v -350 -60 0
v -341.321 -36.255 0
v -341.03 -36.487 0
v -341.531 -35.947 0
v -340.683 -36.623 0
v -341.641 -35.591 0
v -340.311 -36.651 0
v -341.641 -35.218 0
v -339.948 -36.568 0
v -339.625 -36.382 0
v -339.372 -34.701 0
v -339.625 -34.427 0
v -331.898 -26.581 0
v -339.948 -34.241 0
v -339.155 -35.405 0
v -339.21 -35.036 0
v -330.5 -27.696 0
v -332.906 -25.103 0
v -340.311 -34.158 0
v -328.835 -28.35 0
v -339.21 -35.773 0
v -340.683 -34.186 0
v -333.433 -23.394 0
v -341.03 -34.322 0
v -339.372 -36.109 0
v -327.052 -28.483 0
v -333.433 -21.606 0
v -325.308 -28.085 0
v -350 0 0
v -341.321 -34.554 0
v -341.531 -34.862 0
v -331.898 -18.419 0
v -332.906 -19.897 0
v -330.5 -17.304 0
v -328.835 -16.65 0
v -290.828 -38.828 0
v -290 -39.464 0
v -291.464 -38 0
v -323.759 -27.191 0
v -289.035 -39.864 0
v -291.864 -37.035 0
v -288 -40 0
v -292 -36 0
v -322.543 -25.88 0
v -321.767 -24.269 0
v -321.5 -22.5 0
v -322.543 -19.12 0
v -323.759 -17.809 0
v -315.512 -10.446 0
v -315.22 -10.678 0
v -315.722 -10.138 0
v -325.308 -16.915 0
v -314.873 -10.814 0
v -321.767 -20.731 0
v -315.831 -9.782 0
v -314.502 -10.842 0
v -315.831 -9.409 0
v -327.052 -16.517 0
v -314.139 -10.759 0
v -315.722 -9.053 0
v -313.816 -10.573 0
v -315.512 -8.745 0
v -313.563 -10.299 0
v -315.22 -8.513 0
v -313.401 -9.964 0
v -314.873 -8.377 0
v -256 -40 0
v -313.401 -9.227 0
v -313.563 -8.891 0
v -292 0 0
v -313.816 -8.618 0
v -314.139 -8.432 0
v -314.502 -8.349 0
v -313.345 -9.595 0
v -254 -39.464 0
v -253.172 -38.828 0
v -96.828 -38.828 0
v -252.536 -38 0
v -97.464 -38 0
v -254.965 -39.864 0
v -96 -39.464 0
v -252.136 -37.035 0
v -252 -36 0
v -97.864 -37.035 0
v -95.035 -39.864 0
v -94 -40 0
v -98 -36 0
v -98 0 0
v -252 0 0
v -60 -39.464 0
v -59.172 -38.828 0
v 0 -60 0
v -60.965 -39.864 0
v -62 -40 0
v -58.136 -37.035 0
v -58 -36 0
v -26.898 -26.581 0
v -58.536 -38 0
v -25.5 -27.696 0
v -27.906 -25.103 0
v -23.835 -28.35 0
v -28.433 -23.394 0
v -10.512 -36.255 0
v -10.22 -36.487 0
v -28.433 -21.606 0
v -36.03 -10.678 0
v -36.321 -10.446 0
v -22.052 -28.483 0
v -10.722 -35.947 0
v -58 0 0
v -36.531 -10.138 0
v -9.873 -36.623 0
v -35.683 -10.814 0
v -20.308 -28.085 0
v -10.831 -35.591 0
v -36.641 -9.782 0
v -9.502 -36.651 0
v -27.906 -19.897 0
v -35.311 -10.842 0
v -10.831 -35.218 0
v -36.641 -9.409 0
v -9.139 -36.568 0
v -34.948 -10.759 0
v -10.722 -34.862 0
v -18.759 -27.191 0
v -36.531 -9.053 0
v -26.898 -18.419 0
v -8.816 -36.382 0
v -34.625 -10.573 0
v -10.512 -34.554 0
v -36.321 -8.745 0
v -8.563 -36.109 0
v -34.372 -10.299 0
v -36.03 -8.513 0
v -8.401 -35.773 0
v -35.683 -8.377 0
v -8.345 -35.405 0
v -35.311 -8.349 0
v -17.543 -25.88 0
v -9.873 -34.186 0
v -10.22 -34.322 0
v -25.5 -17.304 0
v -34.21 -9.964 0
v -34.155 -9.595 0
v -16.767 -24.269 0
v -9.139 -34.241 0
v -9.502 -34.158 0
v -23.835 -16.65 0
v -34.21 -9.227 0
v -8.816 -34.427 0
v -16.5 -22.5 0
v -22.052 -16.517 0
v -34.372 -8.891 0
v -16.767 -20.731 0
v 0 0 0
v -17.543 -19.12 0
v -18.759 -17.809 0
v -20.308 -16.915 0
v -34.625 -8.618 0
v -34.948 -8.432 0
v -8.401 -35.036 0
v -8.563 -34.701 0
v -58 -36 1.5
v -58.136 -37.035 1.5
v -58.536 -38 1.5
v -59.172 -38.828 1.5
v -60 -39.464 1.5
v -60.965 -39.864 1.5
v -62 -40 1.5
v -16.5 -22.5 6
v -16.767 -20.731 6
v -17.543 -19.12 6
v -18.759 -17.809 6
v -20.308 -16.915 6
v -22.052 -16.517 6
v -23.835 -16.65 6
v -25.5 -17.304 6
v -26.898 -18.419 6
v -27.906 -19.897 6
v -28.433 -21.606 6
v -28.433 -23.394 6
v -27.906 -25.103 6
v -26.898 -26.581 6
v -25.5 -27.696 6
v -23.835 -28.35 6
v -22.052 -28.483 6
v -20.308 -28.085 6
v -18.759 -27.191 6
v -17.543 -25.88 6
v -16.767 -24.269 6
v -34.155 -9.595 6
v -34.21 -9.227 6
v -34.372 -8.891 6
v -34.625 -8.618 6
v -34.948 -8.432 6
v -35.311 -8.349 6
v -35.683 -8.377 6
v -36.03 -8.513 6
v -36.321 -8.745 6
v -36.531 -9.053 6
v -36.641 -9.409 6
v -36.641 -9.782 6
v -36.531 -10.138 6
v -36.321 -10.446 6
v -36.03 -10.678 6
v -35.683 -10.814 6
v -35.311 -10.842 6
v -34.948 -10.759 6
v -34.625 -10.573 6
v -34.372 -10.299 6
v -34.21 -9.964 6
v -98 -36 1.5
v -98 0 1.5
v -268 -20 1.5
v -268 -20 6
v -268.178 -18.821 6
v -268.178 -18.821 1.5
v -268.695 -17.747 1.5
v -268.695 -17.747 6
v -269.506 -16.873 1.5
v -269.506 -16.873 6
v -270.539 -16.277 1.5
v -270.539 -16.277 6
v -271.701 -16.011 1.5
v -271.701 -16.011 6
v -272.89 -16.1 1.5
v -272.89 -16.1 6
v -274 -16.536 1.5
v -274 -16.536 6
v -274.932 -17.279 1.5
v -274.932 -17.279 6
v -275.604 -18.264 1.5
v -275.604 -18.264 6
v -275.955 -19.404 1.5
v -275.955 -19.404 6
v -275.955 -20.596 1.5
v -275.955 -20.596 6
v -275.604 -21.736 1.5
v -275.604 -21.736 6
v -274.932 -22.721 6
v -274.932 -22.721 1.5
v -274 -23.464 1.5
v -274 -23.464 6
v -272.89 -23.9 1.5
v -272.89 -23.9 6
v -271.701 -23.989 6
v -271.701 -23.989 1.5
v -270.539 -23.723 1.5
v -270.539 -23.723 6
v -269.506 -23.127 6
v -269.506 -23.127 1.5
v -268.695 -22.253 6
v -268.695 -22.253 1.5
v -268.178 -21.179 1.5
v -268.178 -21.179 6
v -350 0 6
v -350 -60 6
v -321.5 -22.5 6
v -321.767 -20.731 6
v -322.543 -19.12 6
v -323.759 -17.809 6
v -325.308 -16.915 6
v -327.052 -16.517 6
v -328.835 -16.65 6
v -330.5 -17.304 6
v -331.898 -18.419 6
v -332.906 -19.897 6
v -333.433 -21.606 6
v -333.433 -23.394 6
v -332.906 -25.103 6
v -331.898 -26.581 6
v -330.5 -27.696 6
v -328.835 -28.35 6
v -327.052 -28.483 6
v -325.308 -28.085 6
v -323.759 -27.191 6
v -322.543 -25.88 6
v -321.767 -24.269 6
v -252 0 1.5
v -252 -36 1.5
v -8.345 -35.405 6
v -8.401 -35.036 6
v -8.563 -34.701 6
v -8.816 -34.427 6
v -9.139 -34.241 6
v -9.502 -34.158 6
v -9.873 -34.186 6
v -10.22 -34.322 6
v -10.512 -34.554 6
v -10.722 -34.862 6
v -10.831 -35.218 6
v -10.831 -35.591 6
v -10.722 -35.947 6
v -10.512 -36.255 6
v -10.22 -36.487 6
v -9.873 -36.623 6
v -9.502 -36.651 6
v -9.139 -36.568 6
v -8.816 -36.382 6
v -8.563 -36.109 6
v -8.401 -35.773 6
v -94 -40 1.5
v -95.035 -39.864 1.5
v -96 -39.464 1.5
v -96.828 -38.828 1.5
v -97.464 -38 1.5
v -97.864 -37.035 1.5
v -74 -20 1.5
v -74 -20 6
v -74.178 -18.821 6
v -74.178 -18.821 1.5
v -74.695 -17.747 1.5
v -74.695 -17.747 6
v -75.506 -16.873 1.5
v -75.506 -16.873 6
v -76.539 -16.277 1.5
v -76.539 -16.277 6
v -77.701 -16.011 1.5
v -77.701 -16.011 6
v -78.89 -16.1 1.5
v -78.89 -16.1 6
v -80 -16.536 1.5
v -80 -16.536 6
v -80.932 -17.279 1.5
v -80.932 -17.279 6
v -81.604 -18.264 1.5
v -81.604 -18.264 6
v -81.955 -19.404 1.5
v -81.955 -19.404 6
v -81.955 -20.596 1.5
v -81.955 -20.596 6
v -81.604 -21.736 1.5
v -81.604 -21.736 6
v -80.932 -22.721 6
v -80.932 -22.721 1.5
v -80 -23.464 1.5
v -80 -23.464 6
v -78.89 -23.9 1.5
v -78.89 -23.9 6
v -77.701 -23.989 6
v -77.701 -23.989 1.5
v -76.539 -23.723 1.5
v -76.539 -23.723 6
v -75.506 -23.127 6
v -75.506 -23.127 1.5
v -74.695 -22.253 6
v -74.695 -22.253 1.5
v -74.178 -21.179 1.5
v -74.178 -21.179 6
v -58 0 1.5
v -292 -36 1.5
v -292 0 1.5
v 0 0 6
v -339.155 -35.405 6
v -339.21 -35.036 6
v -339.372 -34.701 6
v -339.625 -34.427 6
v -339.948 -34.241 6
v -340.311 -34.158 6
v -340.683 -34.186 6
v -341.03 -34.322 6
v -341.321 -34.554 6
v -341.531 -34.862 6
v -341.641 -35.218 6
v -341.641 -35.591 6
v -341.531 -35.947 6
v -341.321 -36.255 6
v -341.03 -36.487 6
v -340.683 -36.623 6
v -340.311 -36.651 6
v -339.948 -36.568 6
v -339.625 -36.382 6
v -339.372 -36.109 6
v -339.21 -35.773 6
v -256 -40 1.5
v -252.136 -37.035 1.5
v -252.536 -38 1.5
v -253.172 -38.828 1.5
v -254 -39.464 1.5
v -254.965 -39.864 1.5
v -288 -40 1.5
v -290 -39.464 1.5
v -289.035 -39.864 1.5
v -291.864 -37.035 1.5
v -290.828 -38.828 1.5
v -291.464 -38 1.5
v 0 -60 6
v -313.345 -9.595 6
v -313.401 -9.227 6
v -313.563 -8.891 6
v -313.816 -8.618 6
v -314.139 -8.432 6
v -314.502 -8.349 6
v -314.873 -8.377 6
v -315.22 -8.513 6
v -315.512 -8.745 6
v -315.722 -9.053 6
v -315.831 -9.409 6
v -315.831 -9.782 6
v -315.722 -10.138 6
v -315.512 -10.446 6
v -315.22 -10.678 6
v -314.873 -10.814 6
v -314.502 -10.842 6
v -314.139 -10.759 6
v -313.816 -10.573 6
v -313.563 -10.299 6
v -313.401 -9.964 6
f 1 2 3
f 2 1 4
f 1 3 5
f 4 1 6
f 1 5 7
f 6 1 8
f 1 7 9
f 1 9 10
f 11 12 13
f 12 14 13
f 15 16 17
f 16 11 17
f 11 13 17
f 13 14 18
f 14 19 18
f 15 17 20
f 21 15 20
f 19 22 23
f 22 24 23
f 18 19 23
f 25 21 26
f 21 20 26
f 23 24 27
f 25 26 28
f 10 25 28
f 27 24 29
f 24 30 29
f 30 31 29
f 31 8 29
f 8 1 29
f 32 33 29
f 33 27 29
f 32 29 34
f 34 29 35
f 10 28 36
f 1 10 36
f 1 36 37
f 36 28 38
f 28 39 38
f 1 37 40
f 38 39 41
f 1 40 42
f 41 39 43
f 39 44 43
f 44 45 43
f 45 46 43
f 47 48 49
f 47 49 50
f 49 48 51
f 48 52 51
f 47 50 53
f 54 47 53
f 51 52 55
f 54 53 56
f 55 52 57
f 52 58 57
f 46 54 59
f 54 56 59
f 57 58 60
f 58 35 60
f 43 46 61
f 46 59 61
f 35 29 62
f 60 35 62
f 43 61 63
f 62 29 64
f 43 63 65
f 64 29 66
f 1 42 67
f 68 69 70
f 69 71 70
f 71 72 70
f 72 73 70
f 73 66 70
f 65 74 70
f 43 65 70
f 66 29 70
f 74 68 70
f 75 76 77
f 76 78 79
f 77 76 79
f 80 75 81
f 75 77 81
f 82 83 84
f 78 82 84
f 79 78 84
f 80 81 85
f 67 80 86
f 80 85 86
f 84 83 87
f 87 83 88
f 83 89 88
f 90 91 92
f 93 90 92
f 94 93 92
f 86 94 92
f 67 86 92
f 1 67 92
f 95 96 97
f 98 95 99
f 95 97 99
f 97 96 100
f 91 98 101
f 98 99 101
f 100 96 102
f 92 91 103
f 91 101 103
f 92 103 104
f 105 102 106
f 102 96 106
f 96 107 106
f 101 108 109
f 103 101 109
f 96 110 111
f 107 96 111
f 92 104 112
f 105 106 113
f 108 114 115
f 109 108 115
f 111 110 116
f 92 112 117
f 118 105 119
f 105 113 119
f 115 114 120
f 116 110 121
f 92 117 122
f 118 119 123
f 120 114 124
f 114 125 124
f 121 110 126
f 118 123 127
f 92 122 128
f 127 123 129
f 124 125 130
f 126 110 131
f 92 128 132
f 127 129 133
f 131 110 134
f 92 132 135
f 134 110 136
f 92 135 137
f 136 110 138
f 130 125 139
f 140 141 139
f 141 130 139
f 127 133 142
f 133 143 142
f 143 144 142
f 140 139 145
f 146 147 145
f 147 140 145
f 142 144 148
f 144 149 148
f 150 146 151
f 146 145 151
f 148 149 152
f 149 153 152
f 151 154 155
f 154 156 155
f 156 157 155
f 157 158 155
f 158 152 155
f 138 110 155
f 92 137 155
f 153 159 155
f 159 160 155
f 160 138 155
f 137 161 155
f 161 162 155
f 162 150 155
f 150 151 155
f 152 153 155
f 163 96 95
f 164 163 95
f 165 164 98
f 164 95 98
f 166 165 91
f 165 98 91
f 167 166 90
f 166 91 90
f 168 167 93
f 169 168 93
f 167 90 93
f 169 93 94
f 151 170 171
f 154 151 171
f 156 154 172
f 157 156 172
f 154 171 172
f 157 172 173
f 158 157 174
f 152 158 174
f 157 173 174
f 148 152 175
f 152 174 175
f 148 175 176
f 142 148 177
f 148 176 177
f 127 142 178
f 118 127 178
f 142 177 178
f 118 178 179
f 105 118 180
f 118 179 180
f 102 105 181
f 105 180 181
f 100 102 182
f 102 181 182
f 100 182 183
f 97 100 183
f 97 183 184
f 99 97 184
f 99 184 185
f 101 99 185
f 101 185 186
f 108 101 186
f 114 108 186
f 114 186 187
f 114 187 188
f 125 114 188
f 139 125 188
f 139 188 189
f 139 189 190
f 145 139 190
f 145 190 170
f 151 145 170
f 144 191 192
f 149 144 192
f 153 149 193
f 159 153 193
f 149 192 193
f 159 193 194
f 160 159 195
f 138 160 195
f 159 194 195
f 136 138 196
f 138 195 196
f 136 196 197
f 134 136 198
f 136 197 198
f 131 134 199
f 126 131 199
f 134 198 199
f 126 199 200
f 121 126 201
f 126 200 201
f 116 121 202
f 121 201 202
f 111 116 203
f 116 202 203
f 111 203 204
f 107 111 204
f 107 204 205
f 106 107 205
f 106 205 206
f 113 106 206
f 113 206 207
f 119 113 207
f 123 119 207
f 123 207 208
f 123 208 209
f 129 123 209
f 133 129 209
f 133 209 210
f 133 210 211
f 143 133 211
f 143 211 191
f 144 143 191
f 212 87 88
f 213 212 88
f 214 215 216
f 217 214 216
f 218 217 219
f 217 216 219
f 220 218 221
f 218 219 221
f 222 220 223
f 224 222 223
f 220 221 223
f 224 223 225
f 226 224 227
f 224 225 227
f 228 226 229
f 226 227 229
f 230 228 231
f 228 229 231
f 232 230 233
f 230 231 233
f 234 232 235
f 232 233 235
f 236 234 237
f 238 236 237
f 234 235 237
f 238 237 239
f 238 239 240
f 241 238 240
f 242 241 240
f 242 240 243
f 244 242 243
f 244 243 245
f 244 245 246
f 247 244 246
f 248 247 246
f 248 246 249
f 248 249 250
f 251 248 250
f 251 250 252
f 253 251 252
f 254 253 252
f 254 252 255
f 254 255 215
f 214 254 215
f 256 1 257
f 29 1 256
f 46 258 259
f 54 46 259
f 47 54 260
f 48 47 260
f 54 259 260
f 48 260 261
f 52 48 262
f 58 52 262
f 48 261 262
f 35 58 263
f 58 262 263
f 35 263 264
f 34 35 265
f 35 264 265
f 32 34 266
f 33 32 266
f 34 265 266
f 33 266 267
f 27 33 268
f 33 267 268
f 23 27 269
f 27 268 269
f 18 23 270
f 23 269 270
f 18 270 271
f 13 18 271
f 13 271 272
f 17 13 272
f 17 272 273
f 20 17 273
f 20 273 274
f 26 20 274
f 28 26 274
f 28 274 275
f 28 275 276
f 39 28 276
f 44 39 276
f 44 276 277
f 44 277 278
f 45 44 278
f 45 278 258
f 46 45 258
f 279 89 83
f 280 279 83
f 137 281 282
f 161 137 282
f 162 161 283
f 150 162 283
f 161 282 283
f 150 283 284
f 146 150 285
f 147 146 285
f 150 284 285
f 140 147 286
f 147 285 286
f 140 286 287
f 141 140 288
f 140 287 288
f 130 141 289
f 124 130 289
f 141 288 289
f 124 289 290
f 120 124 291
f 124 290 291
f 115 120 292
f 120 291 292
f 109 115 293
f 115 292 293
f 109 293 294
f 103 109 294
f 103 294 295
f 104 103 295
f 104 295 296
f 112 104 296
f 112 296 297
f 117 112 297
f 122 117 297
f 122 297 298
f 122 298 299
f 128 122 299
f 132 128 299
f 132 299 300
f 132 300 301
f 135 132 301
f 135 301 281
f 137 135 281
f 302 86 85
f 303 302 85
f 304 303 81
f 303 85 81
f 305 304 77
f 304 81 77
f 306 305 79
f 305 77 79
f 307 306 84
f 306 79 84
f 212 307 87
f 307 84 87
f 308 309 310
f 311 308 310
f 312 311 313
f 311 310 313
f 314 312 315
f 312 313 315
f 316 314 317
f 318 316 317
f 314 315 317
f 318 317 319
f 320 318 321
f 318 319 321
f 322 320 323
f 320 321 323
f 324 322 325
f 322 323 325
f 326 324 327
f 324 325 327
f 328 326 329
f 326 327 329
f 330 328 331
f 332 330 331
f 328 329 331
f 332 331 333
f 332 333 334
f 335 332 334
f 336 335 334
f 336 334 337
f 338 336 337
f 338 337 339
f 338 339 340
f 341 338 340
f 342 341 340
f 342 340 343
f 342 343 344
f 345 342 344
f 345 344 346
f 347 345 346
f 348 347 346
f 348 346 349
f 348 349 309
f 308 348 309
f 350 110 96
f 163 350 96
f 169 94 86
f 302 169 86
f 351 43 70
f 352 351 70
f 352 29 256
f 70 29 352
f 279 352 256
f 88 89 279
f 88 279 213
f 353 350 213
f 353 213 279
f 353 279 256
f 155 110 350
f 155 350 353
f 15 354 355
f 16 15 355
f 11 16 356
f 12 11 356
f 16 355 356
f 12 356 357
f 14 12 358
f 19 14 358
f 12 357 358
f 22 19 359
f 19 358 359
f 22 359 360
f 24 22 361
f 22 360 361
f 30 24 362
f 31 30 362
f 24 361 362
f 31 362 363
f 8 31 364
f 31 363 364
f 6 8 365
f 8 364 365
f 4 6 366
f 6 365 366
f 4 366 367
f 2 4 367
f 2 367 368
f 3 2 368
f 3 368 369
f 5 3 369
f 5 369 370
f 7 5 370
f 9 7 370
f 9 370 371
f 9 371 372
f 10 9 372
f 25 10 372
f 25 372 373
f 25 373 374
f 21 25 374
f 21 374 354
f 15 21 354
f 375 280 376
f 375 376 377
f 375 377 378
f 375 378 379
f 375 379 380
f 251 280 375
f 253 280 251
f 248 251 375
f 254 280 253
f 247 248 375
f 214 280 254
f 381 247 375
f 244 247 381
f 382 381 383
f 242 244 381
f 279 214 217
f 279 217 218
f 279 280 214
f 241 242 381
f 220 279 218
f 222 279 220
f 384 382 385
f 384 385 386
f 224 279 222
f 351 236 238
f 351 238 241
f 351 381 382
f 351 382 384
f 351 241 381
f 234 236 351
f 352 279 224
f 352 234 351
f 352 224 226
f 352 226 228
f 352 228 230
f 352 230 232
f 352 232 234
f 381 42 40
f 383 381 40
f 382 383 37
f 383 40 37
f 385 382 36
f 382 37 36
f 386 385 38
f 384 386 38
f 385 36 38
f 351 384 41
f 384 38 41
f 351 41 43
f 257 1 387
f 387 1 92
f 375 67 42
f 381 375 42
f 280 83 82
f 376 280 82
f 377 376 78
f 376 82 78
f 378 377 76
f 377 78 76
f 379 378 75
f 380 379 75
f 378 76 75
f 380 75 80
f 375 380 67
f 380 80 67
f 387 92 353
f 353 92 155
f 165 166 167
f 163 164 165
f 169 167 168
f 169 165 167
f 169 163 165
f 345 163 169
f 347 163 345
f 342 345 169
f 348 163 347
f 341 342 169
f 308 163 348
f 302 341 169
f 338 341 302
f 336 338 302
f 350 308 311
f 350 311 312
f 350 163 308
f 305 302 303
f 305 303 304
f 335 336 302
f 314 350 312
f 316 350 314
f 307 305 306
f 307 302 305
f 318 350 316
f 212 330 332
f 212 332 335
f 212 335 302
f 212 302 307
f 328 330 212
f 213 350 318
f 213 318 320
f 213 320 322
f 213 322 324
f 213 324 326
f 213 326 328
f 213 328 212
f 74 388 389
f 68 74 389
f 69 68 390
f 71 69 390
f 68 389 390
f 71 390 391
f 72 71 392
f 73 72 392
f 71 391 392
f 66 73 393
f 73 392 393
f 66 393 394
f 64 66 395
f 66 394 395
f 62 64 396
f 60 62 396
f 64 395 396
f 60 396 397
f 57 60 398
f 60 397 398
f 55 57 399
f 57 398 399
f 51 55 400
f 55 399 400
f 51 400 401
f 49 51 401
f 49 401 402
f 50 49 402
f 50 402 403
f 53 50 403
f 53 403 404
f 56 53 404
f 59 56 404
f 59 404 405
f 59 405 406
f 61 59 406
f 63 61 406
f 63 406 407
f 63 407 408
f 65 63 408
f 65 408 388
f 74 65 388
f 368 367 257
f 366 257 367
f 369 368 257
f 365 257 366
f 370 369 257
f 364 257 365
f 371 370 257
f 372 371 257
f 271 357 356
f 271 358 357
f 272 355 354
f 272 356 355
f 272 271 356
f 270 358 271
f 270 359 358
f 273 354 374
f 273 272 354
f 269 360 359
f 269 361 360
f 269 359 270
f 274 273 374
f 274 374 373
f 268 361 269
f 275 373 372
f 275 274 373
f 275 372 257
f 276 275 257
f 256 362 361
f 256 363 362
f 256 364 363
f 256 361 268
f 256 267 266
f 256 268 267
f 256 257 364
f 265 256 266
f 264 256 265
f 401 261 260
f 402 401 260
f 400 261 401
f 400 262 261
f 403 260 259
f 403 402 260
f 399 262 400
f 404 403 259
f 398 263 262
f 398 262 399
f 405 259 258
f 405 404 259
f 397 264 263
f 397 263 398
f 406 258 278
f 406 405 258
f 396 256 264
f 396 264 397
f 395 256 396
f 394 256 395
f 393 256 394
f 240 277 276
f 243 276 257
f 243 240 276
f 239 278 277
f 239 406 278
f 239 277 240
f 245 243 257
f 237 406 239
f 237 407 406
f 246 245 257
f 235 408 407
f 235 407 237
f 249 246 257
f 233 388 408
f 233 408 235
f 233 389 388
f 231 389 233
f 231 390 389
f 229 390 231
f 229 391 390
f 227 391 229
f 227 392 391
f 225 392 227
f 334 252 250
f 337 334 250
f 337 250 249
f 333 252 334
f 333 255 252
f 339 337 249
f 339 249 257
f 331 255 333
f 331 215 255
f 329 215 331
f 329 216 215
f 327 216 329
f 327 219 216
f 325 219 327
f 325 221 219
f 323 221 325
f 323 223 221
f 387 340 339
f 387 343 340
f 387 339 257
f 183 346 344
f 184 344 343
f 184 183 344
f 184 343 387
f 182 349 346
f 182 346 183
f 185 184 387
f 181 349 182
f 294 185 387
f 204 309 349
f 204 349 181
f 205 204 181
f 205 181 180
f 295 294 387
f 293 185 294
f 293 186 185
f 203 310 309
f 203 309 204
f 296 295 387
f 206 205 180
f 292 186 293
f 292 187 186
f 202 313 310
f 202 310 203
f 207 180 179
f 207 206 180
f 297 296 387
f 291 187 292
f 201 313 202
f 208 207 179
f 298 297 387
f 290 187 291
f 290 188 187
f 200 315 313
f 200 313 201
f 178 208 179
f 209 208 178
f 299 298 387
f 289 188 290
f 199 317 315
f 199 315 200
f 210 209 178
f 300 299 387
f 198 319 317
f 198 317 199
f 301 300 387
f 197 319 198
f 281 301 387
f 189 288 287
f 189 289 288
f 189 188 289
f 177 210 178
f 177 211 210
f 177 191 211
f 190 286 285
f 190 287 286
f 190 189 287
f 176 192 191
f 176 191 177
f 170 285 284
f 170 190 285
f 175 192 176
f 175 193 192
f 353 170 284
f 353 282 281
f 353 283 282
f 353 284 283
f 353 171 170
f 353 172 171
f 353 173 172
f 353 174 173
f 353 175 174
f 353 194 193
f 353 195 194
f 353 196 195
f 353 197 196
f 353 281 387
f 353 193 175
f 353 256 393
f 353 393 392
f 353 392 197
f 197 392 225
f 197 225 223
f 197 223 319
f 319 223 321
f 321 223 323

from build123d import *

# Parameters (mm, degrees)
CROQUIS1_W              = 350
CROQUIS1_H              = 60
SALIENTE_EXTRUIR1_DEPTH = 6
CROQUIS2_R              = 6
CROQUIS2_R_2            = 1.25
CORTAR_EXTRUIR1_DEPTH   = 7
CORTAR_EXTRUIR4_DEPTH   = 1.5
CROQUIS4_R              = 4
CORTAR_EXTRUIR5_DEPTH   = 7


with BuildPart() as part:
    # Croquis1 → Saliente-Extruir1 (new body)
    with BuildSketch(Plane.XY):
        with Locations((-175, -30)):
            Rectangle(CROQUIS1_W, CROQUIS1_H)
    extrude(amount=SALIENTE_EXTRUIR1_DEPTH)

    # Croquis2 → Cortar-Extruir1 (cut, through all)
    with BuildSketch(Plane.XY.offset(6)):
        with Locations((-327.5, -22.5)):
            Circle(CROQUIS2_R)
        with Locations((-22.5, -22.5)):
            Circle(CROQUIS2_R)
        with Locations((-314.595301243, -9.595301243)):
            Circle(CROQUIS2_R_2)
        with Locations((-340.404698757, -35.404698757)):
            Circle(CROQUIS2_R_2)
        with Locations((-35.404698757, -9.595301243)):
            Circle(CROQUIS2_R_2)
        with Locations((-9.595301243, -35.404698757)):
            Circle(CROQUIS2_R_2)
    extrude(amount=-CORTAR_EXTRUIR1_DEPTH, mode=Mode.SUBTRACT)

    # Croquis3 → Cortar-Extruir4 (cut)
    with BuildSketch(Plane.XY):
        with BuildLine():
            Line((-98, 0), (-58, 0))
            Line((-58, 0), (-58, -36))
            ThreePointArc((-58, -36), (-59.171572875, -38.828427125), (-62, -40))
            Line((-62, -40), (-94, -40))
            ThreePointArc((-94, -40), (-96.828427125, -38.828427125), (-98, -36))
            Line((-98, -36), (-98, 0))
        make_face()
        with BuildLine():
            Line((-292, 0), (-252, 0))
            Line((-252, 0), (-252, -36))
            ThreePointArc((-252, -36), (-253.171572875, -38.828427125), (-256, -40))
            Line((-256, -40), (-288, -40))
            ThreePointArc((-288, -40), (-290.828427125, -38.828427125), (-292, -36))
            Line((-292, -36), (-292, 0))
        make_face()
    extrude(amount=CORTAR_EXTRUIR4_DEPTH, mode=Mode.SUBTRACT)

    # Croquis4 → Cortar-Extruir5 (cut, through all)
    with BuildSketch(Plane.XY.offset(6)):
        with Locations((-272, -20)):
            Circle(CROQUIS4_R)
        with Locations((-78, -20)):
            Circle(CROQUIS4_R)
    extrude(amount=-CORTAR_EXTRUIR5_DEPTH, mode=Mode.SUBTRACT)


solid = part.part
